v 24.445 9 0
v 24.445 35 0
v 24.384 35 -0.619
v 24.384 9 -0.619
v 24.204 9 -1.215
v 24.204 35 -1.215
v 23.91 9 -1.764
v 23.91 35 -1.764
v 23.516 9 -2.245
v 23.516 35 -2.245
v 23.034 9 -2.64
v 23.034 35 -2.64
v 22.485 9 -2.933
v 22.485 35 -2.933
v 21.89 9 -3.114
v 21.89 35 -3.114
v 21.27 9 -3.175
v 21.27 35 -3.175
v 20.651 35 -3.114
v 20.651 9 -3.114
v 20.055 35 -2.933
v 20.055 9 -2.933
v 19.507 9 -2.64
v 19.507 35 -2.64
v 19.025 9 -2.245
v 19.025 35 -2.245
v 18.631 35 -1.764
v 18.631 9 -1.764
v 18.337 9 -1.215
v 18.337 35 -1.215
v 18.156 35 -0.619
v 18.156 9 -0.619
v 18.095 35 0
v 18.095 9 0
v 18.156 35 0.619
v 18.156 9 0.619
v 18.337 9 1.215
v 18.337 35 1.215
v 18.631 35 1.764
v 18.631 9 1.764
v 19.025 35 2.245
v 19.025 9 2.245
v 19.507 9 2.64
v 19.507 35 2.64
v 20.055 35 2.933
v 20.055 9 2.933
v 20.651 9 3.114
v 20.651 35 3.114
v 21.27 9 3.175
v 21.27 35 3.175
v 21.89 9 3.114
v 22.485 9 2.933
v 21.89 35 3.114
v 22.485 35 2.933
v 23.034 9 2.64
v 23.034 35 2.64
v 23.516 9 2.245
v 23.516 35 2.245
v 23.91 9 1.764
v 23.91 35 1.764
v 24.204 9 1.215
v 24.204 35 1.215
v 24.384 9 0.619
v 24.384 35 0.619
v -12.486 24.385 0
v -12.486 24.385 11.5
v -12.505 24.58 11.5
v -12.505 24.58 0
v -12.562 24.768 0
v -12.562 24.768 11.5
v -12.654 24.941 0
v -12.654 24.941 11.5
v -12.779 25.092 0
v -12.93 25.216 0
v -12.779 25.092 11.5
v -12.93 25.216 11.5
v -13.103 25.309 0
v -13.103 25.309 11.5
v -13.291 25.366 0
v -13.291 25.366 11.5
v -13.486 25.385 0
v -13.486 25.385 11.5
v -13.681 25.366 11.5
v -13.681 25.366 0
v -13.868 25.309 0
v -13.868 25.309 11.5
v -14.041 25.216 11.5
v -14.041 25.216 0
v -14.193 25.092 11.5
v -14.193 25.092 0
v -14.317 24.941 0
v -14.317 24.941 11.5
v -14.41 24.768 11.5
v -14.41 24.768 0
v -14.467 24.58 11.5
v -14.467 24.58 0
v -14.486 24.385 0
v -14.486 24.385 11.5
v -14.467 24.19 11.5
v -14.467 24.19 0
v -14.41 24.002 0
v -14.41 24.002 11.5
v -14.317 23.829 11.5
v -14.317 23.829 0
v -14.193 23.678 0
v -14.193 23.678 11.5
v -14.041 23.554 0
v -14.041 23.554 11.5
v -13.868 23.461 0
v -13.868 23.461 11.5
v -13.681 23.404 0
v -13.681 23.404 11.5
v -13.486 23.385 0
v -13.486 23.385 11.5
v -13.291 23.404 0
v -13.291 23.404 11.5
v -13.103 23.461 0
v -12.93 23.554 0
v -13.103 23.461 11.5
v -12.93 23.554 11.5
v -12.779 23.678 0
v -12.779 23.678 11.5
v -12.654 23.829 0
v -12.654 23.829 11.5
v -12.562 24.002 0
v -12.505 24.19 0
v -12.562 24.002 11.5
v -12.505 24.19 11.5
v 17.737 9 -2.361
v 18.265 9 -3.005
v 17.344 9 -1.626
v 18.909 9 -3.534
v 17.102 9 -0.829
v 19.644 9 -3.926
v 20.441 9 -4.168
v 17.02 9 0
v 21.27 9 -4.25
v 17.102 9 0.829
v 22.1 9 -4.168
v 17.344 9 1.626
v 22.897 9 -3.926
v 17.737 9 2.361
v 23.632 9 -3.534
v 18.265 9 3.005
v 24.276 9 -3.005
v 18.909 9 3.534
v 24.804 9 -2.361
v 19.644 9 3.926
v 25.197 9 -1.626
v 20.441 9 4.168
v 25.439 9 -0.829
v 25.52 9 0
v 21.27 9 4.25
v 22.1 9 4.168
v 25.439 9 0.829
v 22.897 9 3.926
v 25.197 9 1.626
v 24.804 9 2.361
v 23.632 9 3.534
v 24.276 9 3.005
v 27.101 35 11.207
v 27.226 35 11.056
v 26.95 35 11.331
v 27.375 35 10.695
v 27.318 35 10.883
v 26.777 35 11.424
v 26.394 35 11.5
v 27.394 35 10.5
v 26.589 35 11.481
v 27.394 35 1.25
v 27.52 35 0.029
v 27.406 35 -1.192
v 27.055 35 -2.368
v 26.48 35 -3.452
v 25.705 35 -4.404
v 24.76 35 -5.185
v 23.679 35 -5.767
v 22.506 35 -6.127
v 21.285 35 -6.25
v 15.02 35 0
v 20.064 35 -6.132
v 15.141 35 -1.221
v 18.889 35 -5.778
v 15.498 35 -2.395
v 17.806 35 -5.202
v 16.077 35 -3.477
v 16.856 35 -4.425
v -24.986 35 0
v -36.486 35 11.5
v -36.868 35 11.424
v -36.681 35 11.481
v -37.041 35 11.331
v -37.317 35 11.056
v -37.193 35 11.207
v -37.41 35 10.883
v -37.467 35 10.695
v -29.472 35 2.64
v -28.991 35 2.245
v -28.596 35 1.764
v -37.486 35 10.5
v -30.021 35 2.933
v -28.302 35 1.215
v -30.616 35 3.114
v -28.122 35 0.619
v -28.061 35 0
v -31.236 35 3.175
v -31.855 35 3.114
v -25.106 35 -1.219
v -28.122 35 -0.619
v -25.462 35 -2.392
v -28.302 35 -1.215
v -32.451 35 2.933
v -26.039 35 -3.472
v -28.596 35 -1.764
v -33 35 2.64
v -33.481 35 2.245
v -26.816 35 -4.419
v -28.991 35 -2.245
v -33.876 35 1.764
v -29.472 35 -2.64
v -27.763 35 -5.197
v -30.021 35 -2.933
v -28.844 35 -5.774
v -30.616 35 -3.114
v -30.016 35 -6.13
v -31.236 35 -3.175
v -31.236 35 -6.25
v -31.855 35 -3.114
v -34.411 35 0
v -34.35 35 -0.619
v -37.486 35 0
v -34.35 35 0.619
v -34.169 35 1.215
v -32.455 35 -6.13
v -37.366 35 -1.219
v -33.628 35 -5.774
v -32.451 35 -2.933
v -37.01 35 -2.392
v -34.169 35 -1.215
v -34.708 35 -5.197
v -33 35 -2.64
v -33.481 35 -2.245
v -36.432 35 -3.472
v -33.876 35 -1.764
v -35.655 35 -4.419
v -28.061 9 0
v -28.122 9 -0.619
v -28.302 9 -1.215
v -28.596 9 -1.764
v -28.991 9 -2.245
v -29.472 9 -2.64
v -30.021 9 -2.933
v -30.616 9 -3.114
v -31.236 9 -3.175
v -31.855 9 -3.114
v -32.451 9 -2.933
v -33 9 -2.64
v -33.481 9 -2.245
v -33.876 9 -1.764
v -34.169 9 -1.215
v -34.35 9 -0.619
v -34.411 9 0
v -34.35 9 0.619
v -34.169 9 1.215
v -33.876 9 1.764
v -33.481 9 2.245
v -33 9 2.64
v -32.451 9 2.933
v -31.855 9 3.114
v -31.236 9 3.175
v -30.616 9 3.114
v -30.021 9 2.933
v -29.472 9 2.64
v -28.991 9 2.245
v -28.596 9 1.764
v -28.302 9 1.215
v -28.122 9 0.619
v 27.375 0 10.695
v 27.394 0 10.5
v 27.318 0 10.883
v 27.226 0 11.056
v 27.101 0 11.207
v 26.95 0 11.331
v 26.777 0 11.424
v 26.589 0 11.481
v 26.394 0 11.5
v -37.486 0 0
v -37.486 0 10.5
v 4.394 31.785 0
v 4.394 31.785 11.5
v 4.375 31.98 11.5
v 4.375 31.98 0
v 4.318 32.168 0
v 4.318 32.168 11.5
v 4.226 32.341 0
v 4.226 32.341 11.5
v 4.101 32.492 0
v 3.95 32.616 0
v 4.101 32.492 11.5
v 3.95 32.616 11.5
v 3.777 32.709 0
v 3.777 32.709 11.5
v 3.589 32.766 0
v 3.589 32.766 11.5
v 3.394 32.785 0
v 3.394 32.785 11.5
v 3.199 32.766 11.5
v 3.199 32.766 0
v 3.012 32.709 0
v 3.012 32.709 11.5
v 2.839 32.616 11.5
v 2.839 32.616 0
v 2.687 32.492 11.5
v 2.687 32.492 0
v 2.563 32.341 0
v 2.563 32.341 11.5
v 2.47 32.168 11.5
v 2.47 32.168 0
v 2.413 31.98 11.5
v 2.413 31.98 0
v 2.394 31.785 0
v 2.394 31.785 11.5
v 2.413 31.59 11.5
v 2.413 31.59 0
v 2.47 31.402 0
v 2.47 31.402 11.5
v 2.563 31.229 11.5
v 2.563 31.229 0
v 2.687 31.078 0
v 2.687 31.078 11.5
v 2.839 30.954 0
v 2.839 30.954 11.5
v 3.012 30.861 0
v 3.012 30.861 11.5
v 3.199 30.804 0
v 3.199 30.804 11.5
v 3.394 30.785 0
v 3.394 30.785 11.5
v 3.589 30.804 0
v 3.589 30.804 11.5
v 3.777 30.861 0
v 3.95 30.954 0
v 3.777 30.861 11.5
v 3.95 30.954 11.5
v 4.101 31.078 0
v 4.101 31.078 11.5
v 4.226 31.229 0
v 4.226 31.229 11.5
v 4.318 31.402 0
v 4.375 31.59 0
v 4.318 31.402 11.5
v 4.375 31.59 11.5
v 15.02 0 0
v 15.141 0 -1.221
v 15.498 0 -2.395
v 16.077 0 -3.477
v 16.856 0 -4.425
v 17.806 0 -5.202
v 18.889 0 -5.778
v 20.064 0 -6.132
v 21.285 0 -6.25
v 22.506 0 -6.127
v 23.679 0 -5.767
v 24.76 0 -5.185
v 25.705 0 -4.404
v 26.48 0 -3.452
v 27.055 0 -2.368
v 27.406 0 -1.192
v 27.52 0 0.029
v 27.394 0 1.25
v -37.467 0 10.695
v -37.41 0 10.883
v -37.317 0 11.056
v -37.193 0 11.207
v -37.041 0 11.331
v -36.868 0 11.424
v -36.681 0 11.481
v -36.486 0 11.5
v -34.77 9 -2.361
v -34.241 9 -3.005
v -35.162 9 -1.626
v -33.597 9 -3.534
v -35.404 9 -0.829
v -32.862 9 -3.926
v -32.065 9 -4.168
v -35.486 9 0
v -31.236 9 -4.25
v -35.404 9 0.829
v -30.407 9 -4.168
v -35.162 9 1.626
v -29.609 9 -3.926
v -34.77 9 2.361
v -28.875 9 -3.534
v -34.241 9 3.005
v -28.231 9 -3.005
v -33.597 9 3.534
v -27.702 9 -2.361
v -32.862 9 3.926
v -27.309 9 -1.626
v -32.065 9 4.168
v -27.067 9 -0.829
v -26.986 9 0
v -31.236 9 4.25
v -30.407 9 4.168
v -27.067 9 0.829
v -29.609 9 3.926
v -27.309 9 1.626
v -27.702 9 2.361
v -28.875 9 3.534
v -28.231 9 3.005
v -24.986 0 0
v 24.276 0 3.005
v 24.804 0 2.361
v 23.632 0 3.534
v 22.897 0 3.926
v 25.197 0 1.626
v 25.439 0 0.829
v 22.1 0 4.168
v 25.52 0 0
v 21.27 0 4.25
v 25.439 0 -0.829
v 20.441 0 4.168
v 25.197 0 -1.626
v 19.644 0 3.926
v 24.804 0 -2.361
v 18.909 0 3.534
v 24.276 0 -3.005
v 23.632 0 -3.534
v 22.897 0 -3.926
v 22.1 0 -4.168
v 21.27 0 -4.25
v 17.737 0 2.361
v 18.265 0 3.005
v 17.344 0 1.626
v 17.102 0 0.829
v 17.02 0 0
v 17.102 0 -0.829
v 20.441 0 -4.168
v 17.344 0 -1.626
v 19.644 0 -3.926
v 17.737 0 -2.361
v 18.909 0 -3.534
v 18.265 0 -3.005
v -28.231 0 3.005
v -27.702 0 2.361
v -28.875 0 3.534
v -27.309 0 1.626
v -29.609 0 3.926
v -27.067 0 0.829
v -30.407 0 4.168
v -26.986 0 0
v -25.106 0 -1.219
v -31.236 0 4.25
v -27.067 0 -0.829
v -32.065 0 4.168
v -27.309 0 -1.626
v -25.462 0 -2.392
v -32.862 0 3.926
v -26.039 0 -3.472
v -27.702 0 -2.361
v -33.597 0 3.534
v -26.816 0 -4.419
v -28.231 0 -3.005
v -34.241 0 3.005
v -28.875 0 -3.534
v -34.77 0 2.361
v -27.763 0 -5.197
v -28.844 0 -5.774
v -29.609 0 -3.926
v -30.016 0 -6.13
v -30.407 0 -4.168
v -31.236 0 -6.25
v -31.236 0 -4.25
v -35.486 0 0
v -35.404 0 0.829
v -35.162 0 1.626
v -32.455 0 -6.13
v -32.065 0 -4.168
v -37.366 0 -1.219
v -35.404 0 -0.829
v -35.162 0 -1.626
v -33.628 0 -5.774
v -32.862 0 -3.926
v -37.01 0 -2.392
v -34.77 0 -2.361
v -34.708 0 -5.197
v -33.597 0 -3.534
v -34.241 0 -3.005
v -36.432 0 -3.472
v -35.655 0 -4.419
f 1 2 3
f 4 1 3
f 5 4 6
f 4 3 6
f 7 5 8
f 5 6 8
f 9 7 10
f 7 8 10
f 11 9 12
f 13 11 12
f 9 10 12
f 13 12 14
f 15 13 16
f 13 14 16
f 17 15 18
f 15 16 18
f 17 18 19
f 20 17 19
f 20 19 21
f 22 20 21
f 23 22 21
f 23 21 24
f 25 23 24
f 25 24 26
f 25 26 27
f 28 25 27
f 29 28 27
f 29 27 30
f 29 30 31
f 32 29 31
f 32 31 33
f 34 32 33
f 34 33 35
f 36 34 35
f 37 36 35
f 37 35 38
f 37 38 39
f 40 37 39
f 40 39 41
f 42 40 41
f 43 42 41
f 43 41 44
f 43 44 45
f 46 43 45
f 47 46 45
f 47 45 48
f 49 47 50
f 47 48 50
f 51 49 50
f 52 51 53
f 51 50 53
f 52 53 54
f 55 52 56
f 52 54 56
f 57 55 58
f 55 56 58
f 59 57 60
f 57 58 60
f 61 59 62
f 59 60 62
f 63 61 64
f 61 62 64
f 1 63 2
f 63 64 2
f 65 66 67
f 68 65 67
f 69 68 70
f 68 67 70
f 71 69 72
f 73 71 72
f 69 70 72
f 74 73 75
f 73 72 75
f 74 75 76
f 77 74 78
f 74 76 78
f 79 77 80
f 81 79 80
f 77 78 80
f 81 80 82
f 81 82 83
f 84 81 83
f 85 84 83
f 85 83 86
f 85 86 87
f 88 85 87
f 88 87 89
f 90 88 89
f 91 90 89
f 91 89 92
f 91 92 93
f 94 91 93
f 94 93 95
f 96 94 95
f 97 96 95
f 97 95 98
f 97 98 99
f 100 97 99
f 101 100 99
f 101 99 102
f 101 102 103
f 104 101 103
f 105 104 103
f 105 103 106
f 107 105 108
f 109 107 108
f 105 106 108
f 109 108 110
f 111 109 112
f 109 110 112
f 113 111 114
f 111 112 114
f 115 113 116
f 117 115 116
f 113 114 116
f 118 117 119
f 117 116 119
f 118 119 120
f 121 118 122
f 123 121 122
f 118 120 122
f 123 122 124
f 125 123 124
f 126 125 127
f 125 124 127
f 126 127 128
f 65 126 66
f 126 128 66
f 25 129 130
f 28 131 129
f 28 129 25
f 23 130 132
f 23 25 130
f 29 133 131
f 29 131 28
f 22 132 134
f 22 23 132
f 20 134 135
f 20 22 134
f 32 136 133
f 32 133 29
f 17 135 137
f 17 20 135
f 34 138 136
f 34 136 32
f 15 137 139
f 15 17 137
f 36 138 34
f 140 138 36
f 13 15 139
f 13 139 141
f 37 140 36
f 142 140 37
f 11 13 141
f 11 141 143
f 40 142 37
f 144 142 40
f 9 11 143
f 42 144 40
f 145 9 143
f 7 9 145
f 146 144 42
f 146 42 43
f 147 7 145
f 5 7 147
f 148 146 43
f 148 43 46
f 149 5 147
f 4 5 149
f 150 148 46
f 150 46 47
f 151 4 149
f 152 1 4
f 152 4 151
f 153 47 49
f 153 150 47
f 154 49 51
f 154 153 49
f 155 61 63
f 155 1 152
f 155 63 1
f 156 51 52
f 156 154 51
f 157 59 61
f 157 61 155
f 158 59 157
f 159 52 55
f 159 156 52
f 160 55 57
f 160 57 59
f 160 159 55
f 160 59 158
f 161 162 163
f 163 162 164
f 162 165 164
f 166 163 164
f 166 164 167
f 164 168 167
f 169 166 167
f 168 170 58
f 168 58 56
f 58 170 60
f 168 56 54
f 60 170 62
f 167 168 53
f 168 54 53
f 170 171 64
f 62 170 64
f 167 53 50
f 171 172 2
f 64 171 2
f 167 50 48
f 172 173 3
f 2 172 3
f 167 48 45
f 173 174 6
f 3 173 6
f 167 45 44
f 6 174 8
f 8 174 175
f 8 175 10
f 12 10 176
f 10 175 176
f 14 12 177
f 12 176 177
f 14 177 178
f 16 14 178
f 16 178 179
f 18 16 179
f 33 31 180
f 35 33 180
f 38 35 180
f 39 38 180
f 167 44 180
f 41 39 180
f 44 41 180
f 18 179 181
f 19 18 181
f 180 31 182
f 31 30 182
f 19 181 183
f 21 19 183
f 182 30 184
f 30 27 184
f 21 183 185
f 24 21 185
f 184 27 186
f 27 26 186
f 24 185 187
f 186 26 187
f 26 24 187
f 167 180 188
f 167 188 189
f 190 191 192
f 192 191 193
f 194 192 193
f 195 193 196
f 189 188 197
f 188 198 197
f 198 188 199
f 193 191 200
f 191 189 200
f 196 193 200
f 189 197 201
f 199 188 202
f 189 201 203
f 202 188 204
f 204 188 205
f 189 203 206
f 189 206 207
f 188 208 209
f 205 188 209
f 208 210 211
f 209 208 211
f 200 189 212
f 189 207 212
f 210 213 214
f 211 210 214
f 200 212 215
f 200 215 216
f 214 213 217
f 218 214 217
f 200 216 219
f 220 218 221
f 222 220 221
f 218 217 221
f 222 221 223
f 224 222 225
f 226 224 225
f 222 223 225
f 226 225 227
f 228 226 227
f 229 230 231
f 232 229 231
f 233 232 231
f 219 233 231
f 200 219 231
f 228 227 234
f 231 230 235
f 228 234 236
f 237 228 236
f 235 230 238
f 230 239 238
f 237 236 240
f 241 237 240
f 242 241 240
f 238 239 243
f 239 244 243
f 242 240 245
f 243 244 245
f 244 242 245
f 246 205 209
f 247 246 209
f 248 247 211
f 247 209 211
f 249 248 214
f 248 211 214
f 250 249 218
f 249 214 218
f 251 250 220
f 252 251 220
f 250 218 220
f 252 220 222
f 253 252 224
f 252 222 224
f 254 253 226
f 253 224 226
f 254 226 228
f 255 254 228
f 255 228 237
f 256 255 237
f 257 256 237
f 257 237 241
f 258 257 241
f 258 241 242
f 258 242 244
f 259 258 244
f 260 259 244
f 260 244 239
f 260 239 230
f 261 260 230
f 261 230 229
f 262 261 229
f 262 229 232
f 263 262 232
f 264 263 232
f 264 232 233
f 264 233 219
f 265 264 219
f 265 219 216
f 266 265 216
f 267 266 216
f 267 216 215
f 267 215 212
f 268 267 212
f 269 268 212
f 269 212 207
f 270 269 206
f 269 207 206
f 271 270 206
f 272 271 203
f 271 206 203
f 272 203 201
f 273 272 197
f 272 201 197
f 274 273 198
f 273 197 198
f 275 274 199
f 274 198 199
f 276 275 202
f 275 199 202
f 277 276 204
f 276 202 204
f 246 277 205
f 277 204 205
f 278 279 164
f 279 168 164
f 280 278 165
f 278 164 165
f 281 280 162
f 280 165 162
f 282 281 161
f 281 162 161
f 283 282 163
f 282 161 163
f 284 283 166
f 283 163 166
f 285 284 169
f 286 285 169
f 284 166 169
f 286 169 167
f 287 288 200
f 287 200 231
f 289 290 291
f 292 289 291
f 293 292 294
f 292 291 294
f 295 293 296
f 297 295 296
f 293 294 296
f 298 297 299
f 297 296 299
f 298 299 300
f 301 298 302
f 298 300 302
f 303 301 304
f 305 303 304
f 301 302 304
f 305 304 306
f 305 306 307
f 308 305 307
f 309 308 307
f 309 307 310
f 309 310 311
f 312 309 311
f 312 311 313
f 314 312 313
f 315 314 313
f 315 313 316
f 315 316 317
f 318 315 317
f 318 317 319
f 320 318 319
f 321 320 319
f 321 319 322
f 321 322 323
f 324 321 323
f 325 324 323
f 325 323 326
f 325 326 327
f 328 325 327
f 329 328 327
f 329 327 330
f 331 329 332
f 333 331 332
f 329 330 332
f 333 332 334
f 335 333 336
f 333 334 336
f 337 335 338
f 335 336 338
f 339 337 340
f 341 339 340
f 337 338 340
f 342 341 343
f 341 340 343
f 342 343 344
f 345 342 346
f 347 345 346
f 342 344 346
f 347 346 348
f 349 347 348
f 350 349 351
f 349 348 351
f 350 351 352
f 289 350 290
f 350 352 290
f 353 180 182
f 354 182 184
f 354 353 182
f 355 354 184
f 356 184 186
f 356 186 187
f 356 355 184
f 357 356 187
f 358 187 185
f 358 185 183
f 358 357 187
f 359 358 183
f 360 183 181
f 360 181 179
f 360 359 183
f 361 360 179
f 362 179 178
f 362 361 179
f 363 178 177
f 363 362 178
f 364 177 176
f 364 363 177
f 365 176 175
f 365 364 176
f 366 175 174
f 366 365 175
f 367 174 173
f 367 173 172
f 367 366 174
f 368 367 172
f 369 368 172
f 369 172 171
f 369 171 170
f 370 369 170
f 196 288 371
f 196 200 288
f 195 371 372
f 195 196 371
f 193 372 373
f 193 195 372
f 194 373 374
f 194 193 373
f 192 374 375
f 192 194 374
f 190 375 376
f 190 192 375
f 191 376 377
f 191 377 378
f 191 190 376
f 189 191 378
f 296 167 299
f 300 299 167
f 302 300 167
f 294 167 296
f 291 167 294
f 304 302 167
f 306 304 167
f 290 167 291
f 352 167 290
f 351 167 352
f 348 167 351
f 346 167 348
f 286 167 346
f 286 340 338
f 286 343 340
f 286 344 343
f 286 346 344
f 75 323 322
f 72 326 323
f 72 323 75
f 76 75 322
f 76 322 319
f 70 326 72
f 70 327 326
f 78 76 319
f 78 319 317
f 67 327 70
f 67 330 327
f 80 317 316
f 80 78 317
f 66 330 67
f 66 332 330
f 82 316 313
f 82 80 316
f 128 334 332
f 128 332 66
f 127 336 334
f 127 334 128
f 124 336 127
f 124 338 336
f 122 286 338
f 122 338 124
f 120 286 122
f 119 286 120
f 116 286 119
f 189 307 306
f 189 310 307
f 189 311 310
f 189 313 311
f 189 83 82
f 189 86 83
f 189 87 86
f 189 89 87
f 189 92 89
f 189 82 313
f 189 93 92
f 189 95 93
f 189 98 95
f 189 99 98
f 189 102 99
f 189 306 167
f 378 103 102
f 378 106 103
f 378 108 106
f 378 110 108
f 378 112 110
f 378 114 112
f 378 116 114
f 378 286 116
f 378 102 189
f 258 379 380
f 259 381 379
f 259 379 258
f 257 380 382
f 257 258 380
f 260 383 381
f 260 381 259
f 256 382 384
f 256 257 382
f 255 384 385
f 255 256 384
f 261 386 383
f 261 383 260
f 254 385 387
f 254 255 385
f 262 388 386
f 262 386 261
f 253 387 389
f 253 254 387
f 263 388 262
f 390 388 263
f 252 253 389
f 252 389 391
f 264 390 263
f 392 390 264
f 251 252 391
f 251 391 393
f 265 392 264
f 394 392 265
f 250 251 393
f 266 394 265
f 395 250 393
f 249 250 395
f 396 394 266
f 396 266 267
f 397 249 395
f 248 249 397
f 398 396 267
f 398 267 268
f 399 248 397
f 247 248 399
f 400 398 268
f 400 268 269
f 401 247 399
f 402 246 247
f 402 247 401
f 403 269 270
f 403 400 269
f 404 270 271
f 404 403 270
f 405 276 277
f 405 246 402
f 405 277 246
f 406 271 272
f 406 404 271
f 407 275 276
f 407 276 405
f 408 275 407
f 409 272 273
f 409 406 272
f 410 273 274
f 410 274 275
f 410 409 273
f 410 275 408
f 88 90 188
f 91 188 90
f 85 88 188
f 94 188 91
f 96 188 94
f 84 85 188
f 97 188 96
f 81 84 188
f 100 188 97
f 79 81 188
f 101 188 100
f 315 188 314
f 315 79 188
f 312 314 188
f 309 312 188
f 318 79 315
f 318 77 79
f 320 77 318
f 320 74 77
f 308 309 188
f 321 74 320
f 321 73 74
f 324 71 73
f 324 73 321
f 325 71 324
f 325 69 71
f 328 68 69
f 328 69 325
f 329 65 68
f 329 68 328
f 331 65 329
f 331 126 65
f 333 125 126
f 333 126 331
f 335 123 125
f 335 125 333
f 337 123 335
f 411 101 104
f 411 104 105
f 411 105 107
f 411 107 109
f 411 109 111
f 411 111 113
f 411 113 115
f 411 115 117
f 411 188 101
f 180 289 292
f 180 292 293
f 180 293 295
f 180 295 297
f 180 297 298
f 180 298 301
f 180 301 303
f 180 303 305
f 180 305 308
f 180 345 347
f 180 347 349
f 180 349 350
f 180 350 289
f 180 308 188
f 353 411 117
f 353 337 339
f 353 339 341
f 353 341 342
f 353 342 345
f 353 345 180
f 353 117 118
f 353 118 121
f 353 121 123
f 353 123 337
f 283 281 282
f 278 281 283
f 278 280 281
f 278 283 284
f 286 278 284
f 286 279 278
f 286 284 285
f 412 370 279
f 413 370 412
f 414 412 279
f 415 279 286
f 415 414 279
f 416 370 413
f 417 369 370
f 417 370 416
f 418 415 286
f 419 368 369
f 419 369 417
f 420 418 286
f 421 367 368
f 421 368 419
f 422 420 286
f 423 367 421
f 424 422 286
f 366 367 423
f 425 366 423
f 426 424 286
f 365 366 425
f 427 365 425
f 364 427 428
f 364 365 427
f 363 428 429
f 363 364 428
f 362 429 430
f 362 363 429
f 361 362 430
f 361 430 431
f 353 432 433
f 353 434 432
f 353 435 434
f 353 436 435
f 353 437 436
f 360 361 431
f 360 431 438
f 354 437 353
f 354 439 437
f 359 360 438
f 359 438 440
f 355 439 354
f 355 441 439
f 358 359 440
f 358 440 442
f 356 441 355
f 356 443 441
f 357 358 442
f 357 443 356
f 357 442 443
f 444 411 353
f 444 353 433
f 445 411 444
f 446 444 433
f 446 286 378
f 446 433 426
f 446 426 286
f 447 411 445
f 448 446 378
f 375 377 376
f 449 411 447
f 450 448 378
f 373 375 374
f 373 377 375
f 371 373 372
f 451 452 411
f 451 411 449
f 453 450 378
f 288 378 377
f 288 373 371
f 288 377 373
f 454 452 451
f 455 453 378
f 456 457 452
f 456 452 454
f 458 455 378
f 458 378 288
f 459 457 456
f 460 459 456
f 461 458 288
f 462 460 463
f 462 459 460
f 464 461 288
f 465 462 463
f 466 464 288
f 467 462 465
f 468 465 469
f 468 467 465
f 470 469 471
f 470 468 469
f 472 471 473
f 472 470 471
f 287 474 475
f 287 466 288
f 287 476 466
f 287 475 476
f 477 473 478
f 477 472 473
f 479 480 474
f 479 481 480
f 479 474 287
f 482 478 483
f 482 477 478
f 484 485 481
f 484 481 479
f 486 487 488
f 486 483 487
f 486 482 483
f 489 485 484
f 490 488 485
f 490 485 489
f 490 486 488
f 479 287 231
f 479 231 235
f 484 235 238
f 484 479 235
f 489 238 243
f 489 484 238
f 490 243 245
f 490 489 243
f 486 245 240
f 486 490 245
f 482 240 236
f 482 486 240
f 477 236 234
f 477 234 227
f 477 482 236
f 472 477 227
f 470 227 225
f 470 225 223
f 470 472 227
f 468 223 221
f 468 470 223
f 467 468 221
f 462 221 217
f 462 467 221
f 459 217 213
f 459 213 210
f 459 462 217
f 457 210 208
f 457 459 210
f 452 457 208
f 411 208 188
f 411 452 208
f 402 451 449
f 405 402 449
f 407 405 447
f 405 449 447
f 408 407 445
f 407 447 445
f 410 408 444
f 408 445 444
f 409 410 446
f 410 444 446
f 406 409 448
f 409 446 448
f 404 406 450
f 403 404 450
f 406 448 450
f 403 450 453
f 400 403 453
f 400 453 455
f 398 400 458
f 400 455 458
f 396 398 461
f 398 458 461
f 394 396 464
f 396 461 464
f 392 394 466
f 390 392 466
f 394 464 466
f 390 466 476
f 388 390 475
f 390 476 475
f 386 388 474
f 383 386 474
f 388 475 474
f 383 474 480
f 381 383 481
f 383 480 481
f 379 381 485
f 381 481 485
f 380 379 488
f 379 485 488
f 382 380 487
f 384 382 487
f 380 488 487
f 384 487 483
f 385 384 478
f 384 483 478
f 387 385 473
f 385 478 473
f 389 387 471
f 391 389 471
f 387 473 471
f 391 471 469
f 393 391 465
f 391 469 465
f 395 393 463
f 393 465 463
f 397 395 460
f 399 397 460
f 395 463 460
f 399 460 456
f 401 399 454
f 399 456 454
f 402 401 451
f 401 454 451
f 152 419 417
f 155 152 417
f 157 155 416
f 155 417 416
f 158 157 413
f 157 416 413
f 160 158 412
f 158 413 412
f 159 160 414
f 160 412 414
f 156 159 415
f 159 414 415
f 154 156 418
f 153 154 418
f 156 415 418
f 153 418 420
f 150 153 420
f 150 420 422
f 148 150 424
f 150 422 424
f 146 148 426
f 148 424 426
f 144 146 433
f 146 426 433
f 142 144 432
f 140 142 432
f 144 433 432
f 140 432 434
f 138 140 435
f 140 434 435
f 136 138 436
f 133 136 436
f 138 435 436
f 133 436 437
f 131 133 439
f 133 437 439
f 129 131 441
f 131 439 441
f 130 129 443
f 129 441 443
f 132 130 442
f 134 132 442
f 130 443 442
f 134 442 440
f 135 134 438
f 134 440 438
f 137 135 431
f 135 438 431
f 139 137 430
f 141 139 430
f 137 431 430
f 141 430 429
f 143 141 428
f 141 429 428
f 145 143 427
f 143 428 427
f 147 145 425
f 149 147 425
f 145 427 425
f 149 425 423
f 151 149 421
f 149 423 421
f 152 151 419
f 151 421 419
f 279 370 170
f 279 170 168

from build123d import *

# Parameters (mm, degrees)
BOSS_EXTRUDE1_DEPTH = 35
SKETCH2_R           = 3.175
CUT_EXTRUDE1_DEPTH  = 36
SKETCH3_R           = 4.25
CUT_EXTRUDE2_DEPTH  = 9
SKETCH4_R           = 1
CUT_EXTRUDE4_DEPTH  = 18.75
FILLET1_R           = 1


with BuildPart() as part:
    # Sketch1 → Boss-Extrude1 (new body)
    with BuildSketch(Plane(origin=(0, 0, 0), x_dir=(1, 0, 0), z_dir=(0, 1, 0))):
        with BuildLine():
            Line((-24.985807588, 0), (15.020468055, 0))
            ThreePointArc((15.020468055, 0), (21.898649068, 6.218350956), (27.394192412, -1.25))
            Line((27.394192412, -1.25), (27.394192412, -11.5))
            Line((27.394192412, -11.5), (-37.485807588, -11.5))
            Line((-37.485807588, -11.5), (-37.485807588, 0))
            ThreePointArc((-37.485807588, 0), (-31.235807588, 6.25), (-24.985807588, 0))
        make_face()
    extrude(amount=BOSS_EXTRUDE1_DEPTH)

    # Sketch2 → Cut-Extrude1 (cut, through all)
    with BuildSketch(Plane(origin=(0, 35, 0), x_dir=(1, 0, 0), z_dir=(0, 1, 0))):
        with Locations((-31.235807588, 0)):
            Circle(SKETCH2_R)
        with Locations((21.270468055, 0)):
            Circle(SKETCH2_R)
    extrude(amount=-CUT_EXTRUDE1_DEPTH, mode=Mode.SUBTRACT)

    # Sketch3 → Cut-Extrude2 (cut)
    with BuildSketch(Plane.XZ):
        with Locations((21.270468055, 0)):
            Circle(SKETCH3_R)
        with Locations((-31.235807588, 0)):
            Circle(SKETCH3_R)
    extrude(amount=-CUT_EXTRUDE2_DEPTH, mode=Mode.SUBTRACT)

    # Sketch4 → Cut-Extrude4 (cut, through all)
    with BuildSketch(Plane.XY.offset(11.5)):
        with Locations((-13.485807588, 24.385)):
            Circle(SKETCH4_R)
        with Locations((3.394192412, 31.785)):
            Circle(SKETCH4_R)
    extrude(amount=-CUT_EXTRUDE4_DEPTH, mode=Mode.SUBTRACT)

    # Fillet1
    fillet1_edges = [part.edges().sort_by_distance(p)[0] for p in [
        (27.394192412, 17.5, 11.5),
        (-37.485807588, 17.5, 11.5),
    ]]
    fillet(fillet1_edges, radius=FILLET1_R)


solid = part.part
